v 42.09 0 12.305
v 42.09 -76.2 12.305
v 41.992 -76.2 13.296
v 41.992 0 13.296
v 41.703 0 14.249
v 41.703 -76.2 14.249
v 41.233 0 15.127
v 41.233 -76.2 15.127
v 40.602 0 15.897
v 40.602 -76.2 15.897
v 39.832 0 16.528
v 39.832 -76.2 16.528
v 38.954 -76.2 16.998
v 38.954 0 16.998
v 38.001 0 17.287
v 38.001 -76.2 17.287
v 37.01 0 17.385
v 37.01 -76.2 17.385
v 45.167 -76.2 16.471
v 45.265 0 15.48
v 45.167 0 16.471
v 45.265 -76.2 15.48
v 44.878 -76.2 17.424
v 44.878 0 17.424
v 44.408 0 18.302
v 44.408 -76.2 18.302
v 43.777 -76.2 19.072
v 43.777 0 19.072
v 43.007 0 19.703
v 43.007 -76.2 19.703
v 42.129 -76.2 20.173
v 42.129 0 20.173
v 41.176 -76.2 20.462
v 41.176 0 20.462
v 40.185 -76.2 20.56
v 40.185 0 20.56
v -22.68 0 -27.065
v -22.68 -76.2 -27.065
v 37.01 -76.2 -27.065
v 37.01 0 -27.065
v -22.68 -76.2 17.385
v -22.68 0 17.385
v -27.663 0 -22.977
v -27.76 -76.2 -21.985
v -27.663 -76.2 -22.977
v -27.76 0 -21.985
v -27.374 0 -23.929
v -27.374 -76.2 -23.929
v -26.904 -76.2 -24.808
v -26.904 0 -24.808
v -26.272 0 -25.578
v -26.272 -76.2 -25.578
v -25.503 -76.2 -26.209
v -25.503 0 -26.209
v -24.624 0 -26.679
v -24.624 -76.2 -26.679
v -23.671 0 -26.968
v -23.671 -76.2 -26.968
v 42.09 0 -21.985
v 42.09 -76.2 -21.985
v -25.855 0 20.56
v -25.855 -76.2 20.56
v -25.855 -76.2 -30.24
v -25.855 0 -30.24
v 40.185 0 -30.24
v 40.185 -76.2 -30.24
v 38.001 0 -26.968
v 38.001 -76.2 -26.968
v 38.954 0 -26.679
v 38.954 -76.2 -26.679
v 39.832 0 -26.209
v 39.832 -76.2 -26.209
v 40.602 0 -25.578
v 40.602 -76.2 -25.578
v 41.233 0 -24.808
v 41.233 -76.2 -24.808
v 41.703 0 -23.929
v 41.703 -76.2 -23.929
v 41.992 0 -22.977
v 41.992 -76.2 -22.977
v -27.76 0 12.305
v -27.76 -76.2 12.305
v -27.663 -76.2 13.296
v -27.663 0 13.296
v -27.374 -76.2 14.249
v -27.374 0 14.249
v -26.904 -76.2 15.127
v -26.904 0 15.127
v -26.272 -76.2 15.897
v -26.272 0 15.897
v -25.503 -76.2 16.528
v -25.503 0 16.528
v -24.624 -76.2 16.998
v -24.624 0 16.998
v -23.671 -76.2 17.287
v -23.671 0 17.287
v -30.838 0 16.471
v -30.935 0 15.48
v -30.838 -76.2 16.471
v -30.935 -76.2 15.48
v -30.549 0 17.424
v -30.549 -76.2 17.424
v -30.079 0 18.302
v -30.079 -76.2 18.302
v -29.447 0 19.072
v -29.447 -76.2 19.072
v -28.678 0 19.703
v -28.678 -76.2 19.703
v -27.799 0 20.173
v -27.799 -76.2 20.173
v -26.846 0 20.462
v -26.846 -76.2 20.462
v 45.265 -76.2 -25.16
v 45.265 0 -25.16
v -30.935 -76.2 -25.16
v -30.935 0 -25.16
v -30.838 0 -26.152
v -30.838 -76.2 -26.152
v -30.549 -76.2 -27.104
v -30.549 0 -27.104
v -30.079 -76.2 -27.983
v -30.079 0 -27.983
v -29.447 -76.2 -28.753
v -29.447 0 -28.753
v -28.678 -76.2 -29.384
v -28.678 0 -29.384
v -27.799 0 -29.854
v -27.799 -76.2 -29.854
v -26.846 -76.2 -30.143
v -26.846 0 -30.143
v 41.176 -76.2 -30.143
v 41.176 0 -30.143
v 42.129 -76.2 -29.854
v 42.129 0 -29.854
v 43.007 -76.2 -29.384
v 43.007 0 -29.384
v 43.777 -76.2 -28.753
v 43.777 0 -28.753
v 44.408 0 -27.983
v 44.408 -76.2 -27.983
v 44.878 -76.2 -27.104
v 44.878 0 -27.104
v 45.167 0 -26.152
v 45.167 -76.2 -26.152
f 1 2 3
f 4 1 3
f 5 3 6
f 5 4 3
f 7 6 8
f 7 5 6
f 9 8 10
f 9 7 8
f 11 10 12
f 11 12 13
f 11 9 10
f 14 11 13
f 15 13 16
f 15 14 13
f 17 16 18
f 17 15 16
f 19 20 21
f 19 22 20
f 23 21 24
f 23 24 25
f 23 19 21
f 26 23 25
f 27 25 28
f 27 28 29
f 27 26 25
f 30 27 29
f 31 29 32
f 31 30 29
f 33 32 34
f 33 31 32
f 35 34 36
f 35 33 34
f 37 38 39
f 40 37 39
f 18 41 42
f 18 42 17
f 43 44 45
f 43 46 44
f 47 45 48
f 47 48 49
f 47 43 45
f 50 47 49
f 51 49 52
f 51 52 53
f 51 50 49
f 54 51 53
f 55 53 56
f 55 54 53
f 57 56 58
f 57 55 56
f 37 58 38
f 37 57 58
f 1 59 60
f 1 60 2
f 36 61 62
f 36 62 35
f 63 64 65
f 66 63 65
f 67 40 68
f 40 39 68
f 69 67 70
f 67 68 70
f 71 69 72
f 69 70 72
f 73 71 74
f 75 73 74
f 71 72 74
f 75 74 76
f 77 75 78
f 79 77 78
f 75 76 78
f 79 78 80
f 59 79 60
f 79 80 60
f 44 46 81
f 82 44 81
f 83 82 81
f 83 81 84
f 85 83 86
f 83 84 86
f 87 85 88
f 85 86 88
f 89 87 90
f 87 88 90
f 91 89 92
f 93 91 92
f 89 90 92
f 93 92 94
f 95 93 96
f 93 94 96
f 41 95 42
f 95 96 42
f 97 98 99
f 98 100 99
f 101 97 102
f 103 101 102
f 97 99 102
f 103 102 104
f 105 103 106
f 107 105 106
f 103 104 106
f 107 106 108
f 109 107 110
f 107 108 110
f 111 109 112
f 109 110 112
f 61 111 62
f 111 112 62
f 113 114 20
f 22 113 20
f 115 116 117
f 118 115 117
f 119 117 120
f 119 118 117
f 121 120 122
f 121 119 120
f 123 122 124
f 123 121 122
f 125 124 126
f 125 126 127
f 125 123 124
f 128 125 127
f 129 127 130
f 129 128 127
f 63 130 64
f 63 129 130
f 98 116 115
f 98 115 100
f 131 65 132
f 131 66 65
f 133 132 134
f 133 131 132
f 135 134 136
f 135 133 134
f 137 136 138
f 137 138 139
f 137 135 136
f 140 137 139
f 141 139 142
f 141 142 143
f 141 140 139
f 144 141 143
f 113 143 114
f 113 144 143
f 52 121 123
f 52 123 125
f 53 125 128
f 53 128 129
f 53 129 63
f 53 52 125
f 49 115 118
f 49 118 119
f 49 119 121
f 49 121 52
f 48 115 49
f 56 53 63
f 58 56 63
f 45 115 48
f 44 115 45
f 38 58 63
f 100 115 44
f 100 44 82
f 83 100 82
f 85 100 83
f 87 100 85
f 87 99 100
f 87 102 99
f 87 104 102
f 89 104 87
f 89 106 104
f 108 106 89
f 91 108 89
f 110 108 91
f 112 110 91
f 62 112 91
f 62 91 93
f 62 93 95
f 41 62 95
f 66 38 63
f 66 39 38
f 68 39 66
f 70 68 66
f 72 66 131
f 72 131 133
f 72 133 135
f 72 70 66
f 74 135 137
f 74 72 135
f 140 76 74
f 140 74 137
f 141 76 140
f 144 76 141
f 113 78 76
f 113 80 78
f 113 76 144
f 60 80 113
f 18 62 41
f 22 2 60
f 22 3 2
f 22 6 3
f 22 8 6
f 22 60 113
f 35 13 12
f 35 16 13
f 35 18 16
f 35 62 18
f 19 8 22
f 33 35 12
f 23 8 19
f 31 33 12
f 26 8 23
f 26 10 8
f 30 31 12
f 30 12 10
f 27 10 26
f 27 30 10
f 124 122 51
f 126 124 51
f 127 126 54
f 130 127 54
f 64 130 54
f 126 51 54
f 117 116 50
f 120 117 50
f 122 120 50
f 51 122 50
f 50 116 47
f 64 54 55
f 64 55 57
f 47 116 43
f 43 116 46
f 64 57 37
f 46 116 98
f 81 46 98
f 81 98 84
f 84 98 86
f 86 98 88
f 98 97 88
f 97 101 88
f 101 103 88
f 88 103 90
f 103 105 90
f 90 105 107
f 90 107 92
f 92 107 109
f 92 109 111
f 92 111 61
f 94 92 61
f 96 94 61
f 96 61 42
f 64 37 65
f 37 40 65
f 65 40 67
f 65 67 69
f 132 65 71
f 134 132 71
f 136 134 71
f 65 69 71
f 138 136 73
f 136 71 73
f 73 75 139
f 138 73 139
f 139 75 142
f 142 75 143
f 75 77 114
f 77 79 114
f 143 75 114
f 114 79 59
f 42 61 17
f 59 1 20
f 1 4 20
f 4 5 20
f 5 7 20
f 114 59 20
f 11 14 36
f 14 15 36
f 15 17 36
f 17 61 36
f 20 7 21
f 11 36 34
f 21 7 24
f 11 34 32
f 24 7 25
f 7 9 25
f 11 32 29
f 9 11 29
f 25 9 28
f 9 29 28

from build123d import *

# Parameters (mm, degrees)
F0_W     = 76.2
F0_H     = 50.8
F1_DEPTH = 76.2
F2_T     = -3.175
F3_R     = 5.08


with BuildPart() as f1:
    # F0 (on Front) → F1 (new body)
    with BuildSketch(Plane.XZ):
        with Locations((7.1646266146, -4.8404615372)):
            Rectangle(F0_W, F0_H)
    extrude(amount=F1_DEPTH)

    # F2
    f2_openings = [f1.faces().sort_by_distance(p)[0] for p in [
        (7.164627, -76.2, -4.840462),
        (7.164627, 0, -4.840462),
    ]]
    offset(amount=F2_T, openings=f2_openings)

    # F3
    f3_edges = [f1.edges().sort_by_distance(p)[0] for p in [
        (45.264627, -38.1, 20.559538),
        (-30.935373, -38.1, 20.559538),
        (45.264627, -38.1, -30.240462),
        (-30.935373, -38.1, -30.240462),
        (42.089627, -38.1, -27.065462),
        (-27.760373, -38.1, -27.065462),
        (-27.760373, -38.1, 17.384538),
        (42.089627, -38.1, 17.384538),
    ]]
    fillet(f3_edges, radius=F3_R)


solid = f1.part
